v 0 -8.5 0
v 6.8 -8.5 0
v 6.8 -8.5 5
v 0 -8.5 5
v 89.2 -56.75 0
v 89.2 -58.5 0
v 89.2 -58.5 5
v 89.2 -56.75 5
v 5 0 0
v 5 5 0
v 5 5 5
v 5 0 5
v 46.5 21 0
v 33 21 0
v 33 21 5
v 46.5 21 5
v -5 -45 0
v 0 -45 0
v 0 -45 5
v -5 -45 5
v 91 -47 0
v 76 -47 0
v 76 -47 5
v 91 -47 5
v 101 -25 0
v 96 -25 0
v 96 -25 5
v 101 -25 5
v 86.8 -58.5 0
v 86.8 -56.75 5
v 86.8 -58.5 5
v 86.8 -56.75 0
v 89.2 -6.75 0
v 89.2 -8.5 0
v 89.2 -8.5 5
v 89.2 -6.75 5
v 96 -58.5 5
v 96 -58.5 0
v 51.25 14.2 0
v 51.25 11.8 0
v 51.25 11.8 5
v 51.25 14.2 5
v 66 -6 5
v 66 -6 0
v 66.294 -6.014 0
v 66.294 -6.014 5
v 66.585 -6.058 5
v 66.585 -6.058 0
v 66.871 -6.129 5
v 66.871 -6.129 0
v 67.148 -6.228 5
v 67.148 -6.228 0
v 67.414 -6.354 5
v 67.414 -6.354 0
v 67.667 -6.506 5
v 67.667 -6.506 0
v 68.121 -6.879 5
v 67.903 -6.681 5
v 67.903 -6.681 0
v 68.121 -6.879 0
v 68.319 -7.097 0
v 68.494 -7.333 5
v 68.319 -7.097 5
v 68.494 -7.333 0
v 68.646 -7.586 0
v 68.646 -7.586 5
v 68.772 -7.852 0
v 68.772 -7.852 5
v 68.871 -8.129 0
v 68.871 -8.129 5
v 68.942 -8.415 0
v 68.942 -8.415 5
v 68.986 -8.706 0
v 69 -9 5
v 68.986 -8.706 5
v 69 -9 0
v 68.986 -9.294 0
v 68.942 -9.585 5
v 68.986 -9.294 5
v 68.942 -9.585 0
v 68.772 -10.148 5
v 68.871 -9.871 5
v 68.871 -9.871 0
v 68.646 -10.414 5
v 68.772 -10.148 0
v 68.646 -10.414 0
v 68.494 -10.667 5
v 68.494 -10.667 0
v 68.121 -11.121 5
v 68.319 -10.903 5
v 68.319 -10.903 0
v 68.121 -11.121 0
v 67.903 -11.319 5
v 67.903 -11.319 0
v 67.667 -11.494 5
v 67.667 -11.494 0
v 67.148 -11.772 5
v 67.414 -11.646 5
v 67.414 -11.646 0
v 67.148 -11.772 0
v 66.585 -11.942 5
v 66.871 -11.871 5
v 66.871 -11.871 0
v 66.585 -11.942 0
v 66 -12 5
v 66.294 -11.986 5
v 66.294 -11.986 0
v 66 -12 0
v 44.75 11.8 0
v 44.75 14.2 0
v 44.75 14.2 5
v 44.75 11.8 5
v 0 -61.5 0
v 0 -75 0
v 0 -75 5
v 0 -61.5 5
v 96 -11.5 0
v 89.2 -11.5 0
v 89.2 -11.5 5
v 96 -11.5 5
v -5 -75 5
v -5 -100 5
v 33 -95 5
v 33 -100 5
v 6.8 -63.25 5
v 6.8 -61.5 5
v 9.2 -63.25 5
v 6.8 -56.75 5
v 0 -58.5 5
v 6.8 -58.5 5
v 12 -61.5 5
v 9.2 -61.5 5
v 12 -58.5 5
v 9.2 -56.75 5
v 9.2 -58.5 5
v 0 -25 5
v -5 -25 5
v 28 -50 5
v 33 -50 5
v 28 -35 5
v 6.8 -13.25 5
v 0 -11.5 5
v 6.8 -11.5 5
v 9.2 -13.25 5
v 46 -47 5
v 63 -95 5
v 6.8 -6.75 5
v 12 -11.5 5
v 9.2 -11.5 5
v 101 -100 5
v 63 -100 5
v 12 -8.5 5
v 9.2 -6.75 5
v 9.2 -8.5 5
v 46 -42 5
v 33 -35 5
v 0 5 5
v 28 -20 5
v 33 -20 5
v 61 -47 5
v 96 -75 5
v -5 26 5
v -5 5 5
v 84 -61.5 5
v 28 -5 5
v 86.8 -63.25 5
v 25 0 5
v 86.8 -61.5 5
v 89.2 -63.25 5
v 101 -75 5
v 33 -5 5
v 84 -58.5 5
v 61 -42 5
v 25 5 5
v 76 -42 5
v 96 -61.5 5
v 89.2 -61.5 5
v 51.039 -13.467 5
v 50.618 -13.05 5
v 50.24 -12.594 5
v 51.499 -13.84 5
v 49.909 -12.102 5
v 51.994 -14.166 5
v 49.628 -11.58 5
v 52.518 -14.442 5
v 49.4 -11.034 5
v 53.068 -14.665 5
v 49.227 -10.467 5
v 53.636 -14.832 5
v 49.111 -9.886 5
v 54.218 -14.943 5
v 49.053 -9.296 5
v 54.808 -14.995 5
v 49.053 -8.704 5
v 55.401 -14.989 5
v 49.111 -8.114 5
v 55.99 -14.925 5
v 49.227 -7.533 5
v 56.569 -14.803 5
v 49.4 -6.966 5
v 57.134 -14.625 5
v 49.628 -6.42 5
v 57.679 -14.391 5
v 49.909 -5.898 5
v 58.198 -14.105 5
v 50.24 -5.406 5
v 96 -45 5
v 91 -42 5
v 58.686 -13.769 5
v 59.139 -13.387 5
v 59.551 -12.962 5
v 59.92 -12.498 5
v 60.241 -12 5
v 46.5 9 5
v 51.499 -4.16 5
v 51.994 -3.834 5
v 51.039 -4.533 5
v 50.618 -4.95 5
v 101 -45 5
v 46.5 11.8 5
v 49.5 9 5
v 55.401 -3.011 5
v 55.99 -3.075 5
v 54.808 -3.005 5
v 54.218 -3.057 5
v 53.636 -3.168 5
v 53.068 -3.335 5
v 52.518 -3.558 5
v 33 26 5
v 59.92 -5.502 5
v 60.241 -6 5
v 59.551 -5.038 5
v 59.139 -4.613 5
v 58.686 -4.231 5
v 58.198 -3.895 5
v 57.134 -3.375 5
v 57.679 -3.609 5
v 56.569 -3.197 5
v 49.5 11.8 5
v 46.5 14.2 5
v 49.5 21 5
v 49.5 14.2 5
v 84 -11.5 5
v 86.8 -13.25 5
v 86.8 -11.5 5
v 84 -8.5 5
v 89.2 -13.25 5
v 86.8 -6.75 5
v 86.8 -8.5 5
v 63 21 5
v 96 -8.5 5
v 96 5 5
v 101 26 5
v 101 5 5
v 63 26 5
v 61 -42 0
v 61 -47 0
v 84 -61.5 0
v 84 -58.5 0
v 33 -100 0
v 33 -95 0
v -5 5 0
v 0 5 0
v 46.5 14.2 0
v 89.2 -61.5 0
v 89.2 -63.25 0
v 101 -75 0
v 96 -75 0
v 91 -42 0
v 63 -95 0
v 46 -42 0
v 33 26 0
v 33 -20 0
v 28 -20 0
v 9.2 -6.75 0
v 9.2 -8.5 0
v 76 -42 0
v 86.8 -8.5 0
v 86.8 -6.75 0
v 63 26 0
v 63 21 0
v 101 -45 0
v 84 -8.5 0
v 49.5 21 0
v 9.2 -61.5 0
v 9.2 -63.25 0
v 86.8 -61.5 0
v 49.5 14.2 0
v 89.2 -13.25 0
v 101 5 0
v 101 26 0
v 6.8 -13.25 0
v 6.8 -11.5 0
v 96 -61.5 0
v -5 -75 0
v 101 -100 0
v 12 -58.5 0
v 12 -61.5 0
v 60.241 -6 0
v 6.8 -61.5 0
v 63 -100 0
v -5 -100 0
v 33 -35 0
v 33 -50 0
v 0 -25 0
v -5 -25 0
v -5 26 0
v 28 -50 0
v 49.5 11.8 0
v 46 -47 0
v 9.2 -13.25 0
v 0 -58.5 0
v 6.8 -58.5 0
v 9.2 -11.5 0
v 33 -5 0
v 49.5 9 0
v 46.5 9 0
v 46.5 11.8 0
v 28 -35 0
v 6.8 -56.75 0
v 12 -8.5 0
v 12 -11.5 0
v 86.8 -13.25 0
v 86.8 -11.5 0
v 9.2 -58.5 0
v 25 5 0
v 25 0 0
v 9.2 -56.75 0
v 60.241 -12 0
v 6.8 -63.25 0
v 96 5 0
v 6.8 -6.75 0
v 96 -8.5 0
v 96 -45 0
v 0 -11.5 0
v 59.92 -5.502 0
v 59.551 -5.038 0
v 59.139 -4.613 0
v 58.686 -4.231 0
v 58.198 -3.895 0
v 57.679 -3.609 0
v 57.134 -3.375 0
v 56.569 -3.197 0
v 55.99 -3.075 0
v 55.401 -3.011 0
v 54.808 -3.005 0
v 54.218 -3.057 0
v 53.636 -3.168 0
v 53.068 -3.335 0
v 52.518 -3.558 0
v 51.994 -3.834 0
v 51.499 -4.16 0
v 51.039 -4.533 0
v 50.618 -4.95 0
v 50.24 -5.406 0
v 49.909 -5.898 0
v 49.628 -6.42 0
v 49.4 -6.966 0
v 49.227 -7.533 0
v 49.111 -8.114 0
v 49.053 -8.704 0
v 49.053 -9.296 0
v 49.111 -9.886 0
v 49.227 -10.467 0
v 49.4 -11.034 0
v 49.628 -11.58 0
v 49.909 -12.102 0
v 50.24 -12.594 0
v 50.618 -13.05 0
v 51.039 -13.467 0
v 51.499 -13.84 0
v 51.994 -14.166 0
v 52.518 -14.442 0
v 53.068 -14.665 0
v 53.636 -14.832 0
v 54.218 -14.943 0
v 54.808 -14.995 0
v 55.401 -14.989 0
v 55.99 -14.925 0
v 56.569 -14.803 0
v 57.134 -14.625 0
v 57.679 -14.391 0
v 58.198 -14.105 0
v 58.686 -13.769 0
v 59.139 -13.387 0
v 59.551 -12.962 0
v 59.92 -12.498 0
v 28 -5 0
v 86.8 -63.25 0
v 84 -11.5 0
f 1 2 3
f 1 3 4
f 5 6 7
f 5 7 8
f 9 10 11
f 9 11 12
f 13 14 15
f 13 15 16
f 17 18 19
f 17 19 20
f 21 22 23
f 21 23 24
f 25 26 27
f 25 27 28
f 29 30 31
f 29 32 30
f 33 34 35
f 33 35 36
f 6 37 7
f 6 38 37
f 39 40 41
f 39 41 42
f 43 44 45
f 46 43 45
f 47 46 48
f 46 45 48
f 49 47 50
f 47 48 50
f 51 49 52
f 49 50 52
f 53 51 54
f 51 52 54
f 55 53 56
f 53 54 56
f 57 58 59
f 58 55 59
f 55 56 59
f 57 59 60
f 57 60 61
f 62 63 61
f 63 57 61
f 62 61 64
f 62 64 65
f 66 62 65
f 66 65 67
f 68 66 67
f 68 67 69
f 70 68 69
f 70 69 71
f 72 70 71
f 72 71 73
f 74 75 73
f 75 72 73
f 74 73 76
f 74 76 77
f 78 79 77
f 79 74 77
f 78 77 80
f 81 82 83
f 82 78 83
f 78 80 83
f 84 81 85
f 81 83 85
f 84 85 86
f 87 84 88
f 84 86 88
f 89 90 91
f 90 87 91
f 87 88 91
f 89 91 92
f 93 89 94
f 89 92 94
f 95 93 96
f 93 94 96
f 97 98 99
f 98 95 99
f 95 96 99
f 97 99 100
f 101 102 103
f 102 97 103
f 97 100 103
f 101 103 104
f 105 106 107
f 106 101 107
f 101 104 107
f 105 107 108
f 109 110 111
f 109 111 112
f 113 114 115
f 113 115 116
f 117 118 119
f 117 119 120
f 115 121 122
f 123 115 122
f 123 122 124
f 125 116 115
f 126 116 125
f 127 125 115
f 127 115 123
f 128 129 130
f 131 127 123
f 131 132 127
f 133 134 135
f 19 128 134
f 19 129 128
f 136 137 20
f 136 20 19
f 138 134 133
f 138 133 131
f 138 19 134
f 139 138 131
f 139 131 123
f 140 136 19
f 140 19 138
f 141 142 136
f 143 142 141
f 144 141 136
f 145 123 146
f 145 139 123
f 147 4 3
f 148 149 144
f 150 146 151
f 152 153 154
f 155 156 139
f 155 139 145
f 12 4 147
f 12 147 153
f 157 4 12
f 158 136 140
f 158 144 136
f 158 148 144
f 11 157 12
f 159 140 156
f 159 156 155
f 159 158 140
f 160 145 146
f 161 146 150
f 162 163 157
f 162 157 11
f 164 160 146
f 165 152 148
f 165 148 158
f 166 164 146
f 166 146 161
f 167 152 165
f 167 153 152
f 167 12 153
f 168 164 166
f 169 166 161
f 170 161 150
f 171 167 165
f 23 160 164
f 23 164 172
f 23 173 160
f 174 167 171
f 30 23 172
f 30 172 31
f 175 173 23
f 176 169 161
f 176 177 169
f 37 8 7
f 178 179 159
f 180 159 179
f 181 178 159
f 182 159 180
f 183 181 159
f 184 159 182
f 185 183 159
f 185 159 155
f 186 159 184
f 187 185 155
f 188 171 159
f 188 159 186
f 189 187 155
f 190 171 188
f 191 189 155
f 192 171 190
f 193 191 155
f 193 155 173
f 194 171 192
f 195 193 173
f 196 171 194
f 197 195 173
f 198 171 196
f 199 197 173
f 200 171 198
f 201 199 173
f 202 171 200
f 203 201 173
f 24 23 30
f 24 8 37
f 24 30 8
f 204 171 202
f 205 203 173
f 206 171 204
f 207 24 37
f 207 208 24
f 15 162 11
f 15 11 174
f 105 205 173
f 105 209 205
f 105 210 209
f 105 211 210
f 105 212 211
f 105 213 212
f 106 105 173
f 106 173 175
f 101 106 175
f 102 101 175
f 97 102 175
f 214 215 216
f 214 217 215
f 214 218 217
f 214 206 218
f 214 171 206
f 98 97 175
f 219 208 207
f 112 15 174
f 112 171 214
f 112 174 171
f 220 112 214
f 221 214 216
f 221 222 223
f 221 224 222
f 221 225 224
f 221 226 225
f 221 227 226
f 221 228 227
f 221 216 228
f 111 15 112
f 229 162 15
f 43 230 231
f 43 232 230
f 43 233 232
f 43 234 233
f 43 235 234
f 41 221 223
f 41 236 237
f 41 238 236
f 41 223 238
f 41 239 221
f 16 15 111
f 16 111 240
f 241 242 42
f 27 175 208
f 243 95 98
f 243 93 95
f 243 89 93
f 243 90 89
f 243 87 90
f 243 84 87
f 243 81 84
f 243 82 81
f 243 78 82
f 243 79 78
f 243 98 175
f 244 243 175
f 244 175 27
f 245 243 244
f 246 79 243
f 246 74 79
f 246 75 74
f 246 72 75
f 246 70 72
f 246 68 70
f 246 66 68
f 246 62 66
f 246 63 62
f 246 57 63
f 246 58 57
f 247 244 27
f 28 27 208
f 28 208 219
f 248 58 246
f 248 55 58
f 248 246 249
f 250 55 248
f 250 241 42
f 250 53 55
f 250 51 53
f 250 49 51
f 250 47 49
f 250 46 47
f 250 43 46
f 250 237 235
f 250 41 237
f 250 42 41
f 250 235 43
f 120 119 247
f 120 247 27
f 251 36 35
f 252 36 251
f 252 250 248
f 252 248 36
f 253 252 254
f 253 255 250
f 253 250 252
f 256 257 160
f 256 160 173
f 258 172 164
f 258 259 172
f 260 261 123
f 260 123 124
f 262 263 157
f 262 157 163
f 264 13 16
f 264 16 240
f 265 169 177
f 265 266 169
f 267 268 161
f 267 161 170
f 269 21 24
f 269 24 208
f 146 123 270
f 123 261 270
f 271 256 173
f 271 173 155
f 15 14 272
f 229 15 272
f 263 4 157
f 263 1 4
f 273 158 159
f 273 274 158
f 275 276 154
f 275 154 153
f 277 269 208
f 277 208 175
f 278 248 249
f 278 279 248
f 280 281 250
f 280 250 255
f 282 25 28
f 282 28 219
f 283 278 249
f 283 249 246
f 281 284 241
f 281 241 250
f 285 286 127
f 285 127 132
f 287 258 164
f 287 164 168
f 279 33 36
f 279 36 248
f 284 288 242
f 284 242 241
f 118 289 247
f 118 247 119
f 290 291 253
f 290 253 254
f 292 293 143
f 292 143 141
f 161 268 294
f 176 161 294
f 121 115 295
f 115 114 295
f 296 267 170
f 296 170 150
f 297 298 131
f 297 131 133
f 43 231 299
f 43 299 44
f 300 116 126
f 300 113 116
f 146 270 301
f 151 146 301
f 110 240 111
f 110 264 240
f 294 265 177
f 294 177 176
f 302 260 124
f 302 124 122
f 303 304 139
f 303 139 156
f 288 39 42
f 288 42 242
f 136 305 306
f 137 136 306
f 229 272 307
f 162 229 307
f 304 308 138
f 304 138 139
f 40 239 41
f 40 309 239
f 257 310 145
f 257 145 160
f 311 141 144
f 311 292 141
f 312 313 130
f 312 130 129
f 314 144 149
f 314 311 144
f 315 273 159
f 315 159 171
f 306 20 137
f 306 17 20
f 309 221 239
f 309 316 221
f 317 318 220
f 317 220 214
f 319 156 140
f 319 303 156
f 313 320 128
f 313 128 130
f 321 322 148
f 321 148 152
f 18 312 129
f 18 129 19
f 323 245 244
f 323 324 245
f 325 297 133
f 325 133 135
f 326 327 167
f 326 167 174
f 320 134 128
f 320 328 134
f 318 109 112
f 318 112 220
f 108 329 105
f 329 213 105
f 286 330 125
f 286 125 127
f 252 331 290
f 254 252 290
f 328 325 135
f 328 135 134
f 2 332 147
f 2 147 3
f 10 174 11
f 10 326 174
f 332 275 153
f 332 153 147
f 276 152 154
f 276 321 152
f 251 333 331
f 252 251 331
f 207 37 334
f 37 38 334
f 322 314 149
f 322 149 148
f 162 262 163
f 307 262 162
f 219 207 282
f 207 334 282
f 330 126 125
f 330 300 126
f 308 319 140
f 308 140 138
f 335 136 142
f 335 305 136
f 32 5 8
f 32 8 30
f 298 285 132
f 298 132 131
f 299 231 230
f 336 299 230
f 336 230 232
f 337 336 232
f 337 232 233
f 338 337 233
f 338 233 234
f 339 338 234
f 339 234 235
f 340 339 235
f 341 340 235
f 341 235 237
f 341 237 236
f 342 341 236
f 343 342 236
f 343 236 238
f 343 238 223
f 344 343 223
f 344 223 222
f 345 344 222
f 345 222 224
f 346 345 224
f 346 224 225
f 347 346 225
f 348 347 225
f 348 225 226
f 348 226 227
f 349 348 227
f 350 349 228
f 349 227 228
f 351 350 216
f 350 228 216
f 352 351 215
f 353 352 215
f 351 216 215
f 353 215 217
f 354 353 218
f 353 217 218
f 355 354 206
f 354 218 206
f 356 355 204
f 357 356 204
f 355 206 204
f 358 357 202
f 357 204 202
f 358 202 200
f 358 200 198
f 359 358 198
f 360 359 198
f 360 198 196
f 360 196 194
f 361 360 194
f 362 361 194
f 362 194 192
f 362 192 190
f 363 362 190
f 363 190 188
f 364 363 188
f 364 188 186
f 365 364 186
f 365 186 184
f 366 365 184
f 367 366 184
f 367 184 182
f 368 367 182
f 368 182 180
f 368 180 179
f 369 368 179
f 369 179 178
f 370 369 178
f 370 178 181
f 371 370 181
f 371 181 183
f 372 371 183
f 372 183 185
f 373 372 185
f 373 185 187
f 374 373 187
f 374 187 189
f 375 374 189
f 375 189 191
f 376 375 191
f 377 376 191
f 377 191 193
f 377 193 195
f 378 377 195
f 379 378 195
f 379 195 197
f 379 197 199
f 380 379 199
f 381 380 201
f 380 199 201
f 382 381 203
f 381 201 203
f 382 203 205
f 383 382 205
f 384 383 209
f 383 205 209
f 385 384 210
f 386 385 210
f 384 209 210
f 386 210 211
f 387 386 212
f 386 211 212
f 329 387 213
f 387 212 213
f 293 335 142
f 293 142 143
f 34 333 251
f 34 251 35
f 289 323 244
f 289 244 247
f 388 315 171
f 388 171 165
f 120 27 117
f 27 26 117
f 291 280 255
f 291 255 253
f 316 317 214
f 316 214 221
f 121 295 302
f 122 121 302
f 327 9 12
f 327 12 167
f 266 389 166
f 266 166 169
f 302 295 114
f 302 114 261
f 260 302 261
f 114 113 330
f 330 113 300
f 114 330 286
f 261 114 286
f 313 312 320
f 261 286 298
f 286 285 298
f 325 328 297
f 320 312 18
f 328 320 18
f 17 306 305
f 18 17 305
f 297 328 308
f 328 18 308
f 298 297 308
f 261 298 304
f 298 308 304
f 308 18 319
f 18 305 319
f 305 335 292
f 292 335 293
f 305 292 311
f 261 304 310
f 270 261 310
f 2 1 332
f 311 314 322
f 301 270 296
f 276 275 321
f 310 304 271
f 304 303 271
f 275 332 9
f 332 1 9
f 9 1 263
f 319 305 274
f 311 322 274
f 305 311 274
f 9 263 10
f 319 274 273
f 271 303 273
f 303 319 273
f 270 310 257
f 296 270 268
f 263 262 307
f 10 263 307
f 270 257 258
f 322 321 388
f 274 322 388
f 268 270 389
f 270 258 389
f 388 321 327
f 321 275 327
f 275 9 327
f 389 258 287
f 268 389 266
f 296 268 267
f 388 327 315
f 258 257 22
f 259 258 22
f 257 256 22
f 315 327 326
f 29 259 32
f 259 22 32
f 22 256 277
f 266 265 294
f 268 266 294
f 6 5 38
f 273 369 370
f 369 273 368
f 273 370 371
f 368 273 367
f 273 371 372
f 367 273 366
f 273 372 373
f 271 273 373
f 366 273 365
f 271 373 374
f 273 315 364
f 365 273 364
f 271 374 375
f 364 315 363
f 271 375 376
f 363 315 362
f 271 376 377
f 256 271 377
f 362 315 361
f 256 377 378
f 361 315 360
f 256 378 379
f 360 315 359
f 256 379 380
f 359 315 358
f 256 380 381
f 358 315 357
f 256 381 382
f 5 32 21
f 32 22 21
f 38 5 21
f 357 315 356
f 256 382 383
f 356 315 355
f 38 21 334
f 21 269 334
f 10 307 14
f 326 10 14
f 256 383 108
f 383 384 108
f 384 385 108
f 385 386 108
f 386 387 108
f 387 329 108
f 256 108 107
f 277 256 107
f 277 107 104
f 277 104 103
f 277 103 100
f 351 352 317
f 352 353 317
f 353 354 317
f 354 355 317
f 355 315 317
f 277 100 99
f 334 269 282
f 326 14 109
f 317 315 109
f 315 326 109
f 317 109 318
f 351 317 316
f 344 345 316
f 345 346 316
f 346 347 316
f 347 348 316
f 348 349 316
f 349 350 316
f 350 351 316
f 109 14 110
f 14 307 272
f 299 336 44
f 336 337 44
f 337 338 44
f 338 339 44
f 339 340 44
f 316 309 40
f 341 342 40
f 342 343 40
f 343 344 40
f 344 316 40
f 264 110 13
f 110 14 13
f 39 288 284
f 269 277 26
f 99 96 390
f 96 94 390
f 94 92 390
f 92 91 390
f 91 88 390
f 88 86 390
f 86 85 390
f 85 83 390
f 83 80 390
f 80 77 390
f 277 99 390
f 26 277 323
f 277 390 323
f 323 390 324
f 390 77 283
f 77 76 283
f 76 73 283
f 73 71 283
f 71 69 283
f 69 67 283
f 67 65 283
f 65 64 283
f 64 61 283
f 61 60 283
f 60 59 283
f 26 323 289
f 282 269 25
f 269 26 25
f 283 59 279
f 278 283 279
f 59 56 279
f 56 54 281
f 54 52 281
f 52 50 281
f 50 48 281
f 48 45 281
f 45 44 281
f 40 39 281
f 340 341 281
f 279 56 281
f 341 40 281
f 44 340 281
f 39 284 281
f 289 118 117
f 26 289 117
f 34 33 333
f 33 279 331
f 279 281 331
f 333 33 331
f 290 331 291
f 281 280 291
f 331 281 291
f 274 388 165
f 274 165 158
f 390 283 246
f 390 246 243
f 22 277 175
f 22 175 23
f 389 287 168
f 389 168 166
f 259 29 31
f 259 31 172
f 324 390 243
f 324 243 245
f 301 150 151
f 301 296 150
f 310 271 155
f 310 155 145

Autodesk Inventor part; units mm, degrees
ref_plane "YZ Plane" through (0, 0, 0) normal (1, 0, 0) x (0, 1, 0)
ref_plane "XZ Plane" through (0, 0, 0) normal (0, 1, 0) x (-1, 0, 0)
ref_plane "XY Plane" through (0, 0, 0) normal (0, 0, 1) x (1, 0, 0)
sketch "草图1" plane through (0, 0, 0) normal (0, 0, 1) x (1, 0, 0)
  circle A0 centre (37.7249, -83) radius 3.6 projected
  line L0 (65, -83) -> (65, -51) projected
  line L1 (65, -51) -> (47, -51) projected
  line L2 (47, -51) -> (47, -83) projected
  line L3 (47, -83) -> (65, -83) projected
  line L4 (89.2, -11.5) -> (96, -11.5) projected
  line L5 (96, -25) -> (96, -11.5) projected
  line L6 (96, -25) -> (101, -25) projected
  line L7 (101, -25) -> (101, -45) projected
  line L8 (96, -45) -> (101, -45) projected
  line L9 (96, -58.5) -> (96, -45) projected
  line L10 (96, -58.5) -> (89.2, -58.5) projected
  line L11 (89.2, -58.5) -> (89.2, -56.75) projected
  line L12 (89.2, -56.75) -> (86.8, -56.75) projected
  line L13 (86.8, -56.75) -> (86.8, -58.5) projected
  line L14 (86.8, -58.5) -> (84, -58.5) projected
  line L15 (84, -58.5) -> (84, -61.5) projected
  line L16 (84, -61.5) -> (86.8, -61.5) projected
  line L17 (86.8, -61.5) -> (86.8, -63.25) projected
  line L18 (86.8, -63.25) -> (89.2, -63.25) projected
  line L19 (89.2, -63.25) -> (89.2, -61.5) projected
  line L20 (89.2, -61.5) -> (96, -61.5) projected
  line L21 (96, -75) -> (96, -61.5) projected
  line L22 (96, -75) -> (101, -75) projected
  line L23 (101, -75) -> (101, -100) projected
  line L24 (101, -100) -> (63, -100) projected
  line L25 (63, -95) -> (63, -100) projected
  line L26 (33, -95) -> (63, -95) projected
  line L27 (33, -95) -> (33, -100) projected
  line L28 (33, -100) -> (-5, -100) projected
  line L29 (-5, -75) -> (-5, -100) projected
  line L30 (0, -75) -> (-5, -75) projected
  line L31 (0, -75) -> (0, -61.5) projected
  line L32 (0, -61.5) -> (6.8, -61.5) projected
  line L33 (6.8, -61.5) -> (6.8, -63.25) projected
  line L34 (6.8, -63.25) -> (9.2, -63.25) projected
  line L35 (9.2, -63.25) -> (9.2, -61.5) projected
  line L36 (9.2, -61.5) -> (12, -61.5) projected
  line L37 (12, -61.5) -> (12, -58.5) projected
  line L38 (12, -58.5) -> (9.2, -58.5) projected
  line L39 (9.2, -58.5) -> (9.2, -56.75) projected
  line L40 (9.2, -56.75) -> (6.8, -56.75) projected
  line L41 (6.8, -56.75) -> (6.8, -58.5) projected
  line L42 (6.8, -58.5) -> (0, -58.5) projected
  line L43 (0, -58.5) -> (0, -45) projected
  line L44 (0, -45) -> (-5, -45) projected
  line L45 (-5, -45) -> (-5, -25) projected
  line L46 (0, -25) -> (-5, -25) projected
  line L47 (0, -25) -> (0, -11.5) projected
  line L48 (0, -11.5) -> (6.8, -11.5) projected
  line L49 (6.8, -11.5) -> (6.8, -13.25) projected
  line L50 (6.8, -13.25) -> (9.2, -13.25) projected
  line L51 (9.2, -13.25) -> (9.2, -11.5) projected
  line L52 (9.2, -11.5) -> (12, -11.5) projected
  line L53 (12, -11.5) -> (12, -8.5) projected
  line L54 (12, -8.5) -> (9.2, -8.5) projected
  line L55 (9.2, -8.5) -> (9.2, -6.75) projected
  line L56 (9.2, -6.75) -> (6.8, -6.75) projected
  line L57 (6.8, -6.75) -> (6.8, -8.5) projected
  line L58 (6.8, -8.5) -> (0, -8.5) projected
  line L59 (0, -8.5) -> (0, 5) projected
  line L60 (0, 5) -> (-5, 5) projected
  line L61 (-5, 5) -> (-5, 26) projected
  line L62 (33, 26) -> (-5, 26) projected
  line L63 (33, 21) -> (33, 26) projected
  line L64 (33, 21) -> (46.5, 21) projected
  line L65 (46.5, 21) -> (46.5, 14.2) projected
  line L66 (46.5, 14.2) -> (44.75, 14.2) projected
  line L67 (44.75, 14.2) -> (44.75, 11.8) projected
  line L68 (44.75, 11.8) -> (46.5, 11.8) projected
  line L69 (46.5, 11.8) -> (46.5, 9) projected
  line L70 (46.5, 9) -> (49.5, 9) projected
  line L71 (49.5, 9) -> (49.5, 11.8) projected
  line L72 (49.5, 11.8) -> (51.25, 11.8) projected
  line L73 (51.25, 11.8) -> (51.25, 14.2) projected
  line L74 (51.25, 14.2) -> (49.5, 14.2) projected
  line L75 (49.5, 14.2) -> (49.5, 21) projected
  line L76 (49.5, 21) -> (63, 21) projected
  line L77 (63, 21) -> (63, 26) projected
  line L78 (63, 26) -> (101, 26) projected
  line L79 (101, 26) -> (101, 5) projected
  line L80 (96, 5) -> (101, 5) projected
  line L81 (96, -8.5) -> (96, 5) projected
  line L82 (96, -8.5) -> (89.2, -8.5) projected
  line L83 (89.2, -8.5) -> (89.2, -6.75) projected
  line L84 (89.2, -6.75) -> (86.8, -6.75) projected
  line L85 (86.8, -6.75) -> (86.8, -8.5) projected
  line L86 (86.8, -8.5) -> (84, -8.5) projected
  line L87 (84, -8.5) -> (84, -11.5) projected
  line L88 (84, -11.5) -> (86.8, -11.5) projected
  line L89 (86.8, -11.5) -> (86.8, -13.25) projected
  line L90 (86.8, -13.25) -> (89.2, -13.25) projected
  line L91 (89.2, -13.25) -> (89.2, -11.5) projected
  line L92 (25, 0) -> (25, 5) projected
  line L93 (25, 5) -> (5, 5) projected
  line L94 (5, 5) -> (5, 0) projected
  line L95 (5, 0) -> (25, 0) projected
  line L96 (28, -35) -> (28, -50) projected
  line L97 (28, -50) -> (33, -50) projected
  line L98 (33, -50) -> (33, -35) projected
  line L99 (33, -35) -> (28, -35) projected
  line L100 (28, -5) -> (28, -20) projected
  line L101 (28, -20) -> (33, -20) projected
  line L102 (33, -20) -> (33, -5) projected
  line L103 (33, -5) -> (28, -5) projected
  line L104 (46, -42) -> (46, -47) projected
  line L105 (46, -47) -> (61, -47) projected
  line L106 (61, -47) -> (61, -42) projected
  line L107 (61, -42) -> (46, -42) projected
  line L108 (76, -42) -> (76, -47) projected
  line L109 (76, -47) -> (91, -47) projected
  line L110 (91, -47) -> (91, -42) projected
  line L111 (91, -42) -> (76, -42) projected
  circle A1 centre (66, -9) radius 3 projected
  point P0 (0, 0)
extrude "拉伸1" add sketch "草图1" along normal blind 5 contours A0 | L3 L2 L1 L0 | L4 L5 L6 L7 L8 L9 L10 L11 L12 L13 L14 L15 L16 L17 L18 L19 L20 L21 L22 L23 L24 L25 L26 L27 L28 L29 L30 L31 L32 L33 L34 L35 L36 L37 L38 L39 L40 L41 L42 L43 L44 L45 L46 L47 L48 L49 L50 L51 L52 L53 L54 L55 L56 L57 L58 L59 L60 L61 L62 L63 L64 L65 L66 L67 L68 L69 L70 L71 L72 L73 L74 L75 L76 L77 L78 L79 L80 L81 L82 L83 L84 L85 L86 L87 L88 L89 L90 L91
sketch "草图2" plane through (0, 0, 5) normal (0, 0, 1) x (1, 0, 0)
  circle A0 centre (66, -9) radius 3 projected
  line L0 (96, -25) -> (96, -11.5) projected
  circle A1 centre (55.0452, -9) radius 6
  line L1 (60.2413, -12) -> (66, -12)
  line L2 (60.2413, -6) -> (66, -6)
  point P0 (0, 0)
  dimension "d2" = 12
extrude "拉伸2" cut sketch "草图2" against normal through all contours A0 L1 A1 L2 | A1
properties part number "left"
